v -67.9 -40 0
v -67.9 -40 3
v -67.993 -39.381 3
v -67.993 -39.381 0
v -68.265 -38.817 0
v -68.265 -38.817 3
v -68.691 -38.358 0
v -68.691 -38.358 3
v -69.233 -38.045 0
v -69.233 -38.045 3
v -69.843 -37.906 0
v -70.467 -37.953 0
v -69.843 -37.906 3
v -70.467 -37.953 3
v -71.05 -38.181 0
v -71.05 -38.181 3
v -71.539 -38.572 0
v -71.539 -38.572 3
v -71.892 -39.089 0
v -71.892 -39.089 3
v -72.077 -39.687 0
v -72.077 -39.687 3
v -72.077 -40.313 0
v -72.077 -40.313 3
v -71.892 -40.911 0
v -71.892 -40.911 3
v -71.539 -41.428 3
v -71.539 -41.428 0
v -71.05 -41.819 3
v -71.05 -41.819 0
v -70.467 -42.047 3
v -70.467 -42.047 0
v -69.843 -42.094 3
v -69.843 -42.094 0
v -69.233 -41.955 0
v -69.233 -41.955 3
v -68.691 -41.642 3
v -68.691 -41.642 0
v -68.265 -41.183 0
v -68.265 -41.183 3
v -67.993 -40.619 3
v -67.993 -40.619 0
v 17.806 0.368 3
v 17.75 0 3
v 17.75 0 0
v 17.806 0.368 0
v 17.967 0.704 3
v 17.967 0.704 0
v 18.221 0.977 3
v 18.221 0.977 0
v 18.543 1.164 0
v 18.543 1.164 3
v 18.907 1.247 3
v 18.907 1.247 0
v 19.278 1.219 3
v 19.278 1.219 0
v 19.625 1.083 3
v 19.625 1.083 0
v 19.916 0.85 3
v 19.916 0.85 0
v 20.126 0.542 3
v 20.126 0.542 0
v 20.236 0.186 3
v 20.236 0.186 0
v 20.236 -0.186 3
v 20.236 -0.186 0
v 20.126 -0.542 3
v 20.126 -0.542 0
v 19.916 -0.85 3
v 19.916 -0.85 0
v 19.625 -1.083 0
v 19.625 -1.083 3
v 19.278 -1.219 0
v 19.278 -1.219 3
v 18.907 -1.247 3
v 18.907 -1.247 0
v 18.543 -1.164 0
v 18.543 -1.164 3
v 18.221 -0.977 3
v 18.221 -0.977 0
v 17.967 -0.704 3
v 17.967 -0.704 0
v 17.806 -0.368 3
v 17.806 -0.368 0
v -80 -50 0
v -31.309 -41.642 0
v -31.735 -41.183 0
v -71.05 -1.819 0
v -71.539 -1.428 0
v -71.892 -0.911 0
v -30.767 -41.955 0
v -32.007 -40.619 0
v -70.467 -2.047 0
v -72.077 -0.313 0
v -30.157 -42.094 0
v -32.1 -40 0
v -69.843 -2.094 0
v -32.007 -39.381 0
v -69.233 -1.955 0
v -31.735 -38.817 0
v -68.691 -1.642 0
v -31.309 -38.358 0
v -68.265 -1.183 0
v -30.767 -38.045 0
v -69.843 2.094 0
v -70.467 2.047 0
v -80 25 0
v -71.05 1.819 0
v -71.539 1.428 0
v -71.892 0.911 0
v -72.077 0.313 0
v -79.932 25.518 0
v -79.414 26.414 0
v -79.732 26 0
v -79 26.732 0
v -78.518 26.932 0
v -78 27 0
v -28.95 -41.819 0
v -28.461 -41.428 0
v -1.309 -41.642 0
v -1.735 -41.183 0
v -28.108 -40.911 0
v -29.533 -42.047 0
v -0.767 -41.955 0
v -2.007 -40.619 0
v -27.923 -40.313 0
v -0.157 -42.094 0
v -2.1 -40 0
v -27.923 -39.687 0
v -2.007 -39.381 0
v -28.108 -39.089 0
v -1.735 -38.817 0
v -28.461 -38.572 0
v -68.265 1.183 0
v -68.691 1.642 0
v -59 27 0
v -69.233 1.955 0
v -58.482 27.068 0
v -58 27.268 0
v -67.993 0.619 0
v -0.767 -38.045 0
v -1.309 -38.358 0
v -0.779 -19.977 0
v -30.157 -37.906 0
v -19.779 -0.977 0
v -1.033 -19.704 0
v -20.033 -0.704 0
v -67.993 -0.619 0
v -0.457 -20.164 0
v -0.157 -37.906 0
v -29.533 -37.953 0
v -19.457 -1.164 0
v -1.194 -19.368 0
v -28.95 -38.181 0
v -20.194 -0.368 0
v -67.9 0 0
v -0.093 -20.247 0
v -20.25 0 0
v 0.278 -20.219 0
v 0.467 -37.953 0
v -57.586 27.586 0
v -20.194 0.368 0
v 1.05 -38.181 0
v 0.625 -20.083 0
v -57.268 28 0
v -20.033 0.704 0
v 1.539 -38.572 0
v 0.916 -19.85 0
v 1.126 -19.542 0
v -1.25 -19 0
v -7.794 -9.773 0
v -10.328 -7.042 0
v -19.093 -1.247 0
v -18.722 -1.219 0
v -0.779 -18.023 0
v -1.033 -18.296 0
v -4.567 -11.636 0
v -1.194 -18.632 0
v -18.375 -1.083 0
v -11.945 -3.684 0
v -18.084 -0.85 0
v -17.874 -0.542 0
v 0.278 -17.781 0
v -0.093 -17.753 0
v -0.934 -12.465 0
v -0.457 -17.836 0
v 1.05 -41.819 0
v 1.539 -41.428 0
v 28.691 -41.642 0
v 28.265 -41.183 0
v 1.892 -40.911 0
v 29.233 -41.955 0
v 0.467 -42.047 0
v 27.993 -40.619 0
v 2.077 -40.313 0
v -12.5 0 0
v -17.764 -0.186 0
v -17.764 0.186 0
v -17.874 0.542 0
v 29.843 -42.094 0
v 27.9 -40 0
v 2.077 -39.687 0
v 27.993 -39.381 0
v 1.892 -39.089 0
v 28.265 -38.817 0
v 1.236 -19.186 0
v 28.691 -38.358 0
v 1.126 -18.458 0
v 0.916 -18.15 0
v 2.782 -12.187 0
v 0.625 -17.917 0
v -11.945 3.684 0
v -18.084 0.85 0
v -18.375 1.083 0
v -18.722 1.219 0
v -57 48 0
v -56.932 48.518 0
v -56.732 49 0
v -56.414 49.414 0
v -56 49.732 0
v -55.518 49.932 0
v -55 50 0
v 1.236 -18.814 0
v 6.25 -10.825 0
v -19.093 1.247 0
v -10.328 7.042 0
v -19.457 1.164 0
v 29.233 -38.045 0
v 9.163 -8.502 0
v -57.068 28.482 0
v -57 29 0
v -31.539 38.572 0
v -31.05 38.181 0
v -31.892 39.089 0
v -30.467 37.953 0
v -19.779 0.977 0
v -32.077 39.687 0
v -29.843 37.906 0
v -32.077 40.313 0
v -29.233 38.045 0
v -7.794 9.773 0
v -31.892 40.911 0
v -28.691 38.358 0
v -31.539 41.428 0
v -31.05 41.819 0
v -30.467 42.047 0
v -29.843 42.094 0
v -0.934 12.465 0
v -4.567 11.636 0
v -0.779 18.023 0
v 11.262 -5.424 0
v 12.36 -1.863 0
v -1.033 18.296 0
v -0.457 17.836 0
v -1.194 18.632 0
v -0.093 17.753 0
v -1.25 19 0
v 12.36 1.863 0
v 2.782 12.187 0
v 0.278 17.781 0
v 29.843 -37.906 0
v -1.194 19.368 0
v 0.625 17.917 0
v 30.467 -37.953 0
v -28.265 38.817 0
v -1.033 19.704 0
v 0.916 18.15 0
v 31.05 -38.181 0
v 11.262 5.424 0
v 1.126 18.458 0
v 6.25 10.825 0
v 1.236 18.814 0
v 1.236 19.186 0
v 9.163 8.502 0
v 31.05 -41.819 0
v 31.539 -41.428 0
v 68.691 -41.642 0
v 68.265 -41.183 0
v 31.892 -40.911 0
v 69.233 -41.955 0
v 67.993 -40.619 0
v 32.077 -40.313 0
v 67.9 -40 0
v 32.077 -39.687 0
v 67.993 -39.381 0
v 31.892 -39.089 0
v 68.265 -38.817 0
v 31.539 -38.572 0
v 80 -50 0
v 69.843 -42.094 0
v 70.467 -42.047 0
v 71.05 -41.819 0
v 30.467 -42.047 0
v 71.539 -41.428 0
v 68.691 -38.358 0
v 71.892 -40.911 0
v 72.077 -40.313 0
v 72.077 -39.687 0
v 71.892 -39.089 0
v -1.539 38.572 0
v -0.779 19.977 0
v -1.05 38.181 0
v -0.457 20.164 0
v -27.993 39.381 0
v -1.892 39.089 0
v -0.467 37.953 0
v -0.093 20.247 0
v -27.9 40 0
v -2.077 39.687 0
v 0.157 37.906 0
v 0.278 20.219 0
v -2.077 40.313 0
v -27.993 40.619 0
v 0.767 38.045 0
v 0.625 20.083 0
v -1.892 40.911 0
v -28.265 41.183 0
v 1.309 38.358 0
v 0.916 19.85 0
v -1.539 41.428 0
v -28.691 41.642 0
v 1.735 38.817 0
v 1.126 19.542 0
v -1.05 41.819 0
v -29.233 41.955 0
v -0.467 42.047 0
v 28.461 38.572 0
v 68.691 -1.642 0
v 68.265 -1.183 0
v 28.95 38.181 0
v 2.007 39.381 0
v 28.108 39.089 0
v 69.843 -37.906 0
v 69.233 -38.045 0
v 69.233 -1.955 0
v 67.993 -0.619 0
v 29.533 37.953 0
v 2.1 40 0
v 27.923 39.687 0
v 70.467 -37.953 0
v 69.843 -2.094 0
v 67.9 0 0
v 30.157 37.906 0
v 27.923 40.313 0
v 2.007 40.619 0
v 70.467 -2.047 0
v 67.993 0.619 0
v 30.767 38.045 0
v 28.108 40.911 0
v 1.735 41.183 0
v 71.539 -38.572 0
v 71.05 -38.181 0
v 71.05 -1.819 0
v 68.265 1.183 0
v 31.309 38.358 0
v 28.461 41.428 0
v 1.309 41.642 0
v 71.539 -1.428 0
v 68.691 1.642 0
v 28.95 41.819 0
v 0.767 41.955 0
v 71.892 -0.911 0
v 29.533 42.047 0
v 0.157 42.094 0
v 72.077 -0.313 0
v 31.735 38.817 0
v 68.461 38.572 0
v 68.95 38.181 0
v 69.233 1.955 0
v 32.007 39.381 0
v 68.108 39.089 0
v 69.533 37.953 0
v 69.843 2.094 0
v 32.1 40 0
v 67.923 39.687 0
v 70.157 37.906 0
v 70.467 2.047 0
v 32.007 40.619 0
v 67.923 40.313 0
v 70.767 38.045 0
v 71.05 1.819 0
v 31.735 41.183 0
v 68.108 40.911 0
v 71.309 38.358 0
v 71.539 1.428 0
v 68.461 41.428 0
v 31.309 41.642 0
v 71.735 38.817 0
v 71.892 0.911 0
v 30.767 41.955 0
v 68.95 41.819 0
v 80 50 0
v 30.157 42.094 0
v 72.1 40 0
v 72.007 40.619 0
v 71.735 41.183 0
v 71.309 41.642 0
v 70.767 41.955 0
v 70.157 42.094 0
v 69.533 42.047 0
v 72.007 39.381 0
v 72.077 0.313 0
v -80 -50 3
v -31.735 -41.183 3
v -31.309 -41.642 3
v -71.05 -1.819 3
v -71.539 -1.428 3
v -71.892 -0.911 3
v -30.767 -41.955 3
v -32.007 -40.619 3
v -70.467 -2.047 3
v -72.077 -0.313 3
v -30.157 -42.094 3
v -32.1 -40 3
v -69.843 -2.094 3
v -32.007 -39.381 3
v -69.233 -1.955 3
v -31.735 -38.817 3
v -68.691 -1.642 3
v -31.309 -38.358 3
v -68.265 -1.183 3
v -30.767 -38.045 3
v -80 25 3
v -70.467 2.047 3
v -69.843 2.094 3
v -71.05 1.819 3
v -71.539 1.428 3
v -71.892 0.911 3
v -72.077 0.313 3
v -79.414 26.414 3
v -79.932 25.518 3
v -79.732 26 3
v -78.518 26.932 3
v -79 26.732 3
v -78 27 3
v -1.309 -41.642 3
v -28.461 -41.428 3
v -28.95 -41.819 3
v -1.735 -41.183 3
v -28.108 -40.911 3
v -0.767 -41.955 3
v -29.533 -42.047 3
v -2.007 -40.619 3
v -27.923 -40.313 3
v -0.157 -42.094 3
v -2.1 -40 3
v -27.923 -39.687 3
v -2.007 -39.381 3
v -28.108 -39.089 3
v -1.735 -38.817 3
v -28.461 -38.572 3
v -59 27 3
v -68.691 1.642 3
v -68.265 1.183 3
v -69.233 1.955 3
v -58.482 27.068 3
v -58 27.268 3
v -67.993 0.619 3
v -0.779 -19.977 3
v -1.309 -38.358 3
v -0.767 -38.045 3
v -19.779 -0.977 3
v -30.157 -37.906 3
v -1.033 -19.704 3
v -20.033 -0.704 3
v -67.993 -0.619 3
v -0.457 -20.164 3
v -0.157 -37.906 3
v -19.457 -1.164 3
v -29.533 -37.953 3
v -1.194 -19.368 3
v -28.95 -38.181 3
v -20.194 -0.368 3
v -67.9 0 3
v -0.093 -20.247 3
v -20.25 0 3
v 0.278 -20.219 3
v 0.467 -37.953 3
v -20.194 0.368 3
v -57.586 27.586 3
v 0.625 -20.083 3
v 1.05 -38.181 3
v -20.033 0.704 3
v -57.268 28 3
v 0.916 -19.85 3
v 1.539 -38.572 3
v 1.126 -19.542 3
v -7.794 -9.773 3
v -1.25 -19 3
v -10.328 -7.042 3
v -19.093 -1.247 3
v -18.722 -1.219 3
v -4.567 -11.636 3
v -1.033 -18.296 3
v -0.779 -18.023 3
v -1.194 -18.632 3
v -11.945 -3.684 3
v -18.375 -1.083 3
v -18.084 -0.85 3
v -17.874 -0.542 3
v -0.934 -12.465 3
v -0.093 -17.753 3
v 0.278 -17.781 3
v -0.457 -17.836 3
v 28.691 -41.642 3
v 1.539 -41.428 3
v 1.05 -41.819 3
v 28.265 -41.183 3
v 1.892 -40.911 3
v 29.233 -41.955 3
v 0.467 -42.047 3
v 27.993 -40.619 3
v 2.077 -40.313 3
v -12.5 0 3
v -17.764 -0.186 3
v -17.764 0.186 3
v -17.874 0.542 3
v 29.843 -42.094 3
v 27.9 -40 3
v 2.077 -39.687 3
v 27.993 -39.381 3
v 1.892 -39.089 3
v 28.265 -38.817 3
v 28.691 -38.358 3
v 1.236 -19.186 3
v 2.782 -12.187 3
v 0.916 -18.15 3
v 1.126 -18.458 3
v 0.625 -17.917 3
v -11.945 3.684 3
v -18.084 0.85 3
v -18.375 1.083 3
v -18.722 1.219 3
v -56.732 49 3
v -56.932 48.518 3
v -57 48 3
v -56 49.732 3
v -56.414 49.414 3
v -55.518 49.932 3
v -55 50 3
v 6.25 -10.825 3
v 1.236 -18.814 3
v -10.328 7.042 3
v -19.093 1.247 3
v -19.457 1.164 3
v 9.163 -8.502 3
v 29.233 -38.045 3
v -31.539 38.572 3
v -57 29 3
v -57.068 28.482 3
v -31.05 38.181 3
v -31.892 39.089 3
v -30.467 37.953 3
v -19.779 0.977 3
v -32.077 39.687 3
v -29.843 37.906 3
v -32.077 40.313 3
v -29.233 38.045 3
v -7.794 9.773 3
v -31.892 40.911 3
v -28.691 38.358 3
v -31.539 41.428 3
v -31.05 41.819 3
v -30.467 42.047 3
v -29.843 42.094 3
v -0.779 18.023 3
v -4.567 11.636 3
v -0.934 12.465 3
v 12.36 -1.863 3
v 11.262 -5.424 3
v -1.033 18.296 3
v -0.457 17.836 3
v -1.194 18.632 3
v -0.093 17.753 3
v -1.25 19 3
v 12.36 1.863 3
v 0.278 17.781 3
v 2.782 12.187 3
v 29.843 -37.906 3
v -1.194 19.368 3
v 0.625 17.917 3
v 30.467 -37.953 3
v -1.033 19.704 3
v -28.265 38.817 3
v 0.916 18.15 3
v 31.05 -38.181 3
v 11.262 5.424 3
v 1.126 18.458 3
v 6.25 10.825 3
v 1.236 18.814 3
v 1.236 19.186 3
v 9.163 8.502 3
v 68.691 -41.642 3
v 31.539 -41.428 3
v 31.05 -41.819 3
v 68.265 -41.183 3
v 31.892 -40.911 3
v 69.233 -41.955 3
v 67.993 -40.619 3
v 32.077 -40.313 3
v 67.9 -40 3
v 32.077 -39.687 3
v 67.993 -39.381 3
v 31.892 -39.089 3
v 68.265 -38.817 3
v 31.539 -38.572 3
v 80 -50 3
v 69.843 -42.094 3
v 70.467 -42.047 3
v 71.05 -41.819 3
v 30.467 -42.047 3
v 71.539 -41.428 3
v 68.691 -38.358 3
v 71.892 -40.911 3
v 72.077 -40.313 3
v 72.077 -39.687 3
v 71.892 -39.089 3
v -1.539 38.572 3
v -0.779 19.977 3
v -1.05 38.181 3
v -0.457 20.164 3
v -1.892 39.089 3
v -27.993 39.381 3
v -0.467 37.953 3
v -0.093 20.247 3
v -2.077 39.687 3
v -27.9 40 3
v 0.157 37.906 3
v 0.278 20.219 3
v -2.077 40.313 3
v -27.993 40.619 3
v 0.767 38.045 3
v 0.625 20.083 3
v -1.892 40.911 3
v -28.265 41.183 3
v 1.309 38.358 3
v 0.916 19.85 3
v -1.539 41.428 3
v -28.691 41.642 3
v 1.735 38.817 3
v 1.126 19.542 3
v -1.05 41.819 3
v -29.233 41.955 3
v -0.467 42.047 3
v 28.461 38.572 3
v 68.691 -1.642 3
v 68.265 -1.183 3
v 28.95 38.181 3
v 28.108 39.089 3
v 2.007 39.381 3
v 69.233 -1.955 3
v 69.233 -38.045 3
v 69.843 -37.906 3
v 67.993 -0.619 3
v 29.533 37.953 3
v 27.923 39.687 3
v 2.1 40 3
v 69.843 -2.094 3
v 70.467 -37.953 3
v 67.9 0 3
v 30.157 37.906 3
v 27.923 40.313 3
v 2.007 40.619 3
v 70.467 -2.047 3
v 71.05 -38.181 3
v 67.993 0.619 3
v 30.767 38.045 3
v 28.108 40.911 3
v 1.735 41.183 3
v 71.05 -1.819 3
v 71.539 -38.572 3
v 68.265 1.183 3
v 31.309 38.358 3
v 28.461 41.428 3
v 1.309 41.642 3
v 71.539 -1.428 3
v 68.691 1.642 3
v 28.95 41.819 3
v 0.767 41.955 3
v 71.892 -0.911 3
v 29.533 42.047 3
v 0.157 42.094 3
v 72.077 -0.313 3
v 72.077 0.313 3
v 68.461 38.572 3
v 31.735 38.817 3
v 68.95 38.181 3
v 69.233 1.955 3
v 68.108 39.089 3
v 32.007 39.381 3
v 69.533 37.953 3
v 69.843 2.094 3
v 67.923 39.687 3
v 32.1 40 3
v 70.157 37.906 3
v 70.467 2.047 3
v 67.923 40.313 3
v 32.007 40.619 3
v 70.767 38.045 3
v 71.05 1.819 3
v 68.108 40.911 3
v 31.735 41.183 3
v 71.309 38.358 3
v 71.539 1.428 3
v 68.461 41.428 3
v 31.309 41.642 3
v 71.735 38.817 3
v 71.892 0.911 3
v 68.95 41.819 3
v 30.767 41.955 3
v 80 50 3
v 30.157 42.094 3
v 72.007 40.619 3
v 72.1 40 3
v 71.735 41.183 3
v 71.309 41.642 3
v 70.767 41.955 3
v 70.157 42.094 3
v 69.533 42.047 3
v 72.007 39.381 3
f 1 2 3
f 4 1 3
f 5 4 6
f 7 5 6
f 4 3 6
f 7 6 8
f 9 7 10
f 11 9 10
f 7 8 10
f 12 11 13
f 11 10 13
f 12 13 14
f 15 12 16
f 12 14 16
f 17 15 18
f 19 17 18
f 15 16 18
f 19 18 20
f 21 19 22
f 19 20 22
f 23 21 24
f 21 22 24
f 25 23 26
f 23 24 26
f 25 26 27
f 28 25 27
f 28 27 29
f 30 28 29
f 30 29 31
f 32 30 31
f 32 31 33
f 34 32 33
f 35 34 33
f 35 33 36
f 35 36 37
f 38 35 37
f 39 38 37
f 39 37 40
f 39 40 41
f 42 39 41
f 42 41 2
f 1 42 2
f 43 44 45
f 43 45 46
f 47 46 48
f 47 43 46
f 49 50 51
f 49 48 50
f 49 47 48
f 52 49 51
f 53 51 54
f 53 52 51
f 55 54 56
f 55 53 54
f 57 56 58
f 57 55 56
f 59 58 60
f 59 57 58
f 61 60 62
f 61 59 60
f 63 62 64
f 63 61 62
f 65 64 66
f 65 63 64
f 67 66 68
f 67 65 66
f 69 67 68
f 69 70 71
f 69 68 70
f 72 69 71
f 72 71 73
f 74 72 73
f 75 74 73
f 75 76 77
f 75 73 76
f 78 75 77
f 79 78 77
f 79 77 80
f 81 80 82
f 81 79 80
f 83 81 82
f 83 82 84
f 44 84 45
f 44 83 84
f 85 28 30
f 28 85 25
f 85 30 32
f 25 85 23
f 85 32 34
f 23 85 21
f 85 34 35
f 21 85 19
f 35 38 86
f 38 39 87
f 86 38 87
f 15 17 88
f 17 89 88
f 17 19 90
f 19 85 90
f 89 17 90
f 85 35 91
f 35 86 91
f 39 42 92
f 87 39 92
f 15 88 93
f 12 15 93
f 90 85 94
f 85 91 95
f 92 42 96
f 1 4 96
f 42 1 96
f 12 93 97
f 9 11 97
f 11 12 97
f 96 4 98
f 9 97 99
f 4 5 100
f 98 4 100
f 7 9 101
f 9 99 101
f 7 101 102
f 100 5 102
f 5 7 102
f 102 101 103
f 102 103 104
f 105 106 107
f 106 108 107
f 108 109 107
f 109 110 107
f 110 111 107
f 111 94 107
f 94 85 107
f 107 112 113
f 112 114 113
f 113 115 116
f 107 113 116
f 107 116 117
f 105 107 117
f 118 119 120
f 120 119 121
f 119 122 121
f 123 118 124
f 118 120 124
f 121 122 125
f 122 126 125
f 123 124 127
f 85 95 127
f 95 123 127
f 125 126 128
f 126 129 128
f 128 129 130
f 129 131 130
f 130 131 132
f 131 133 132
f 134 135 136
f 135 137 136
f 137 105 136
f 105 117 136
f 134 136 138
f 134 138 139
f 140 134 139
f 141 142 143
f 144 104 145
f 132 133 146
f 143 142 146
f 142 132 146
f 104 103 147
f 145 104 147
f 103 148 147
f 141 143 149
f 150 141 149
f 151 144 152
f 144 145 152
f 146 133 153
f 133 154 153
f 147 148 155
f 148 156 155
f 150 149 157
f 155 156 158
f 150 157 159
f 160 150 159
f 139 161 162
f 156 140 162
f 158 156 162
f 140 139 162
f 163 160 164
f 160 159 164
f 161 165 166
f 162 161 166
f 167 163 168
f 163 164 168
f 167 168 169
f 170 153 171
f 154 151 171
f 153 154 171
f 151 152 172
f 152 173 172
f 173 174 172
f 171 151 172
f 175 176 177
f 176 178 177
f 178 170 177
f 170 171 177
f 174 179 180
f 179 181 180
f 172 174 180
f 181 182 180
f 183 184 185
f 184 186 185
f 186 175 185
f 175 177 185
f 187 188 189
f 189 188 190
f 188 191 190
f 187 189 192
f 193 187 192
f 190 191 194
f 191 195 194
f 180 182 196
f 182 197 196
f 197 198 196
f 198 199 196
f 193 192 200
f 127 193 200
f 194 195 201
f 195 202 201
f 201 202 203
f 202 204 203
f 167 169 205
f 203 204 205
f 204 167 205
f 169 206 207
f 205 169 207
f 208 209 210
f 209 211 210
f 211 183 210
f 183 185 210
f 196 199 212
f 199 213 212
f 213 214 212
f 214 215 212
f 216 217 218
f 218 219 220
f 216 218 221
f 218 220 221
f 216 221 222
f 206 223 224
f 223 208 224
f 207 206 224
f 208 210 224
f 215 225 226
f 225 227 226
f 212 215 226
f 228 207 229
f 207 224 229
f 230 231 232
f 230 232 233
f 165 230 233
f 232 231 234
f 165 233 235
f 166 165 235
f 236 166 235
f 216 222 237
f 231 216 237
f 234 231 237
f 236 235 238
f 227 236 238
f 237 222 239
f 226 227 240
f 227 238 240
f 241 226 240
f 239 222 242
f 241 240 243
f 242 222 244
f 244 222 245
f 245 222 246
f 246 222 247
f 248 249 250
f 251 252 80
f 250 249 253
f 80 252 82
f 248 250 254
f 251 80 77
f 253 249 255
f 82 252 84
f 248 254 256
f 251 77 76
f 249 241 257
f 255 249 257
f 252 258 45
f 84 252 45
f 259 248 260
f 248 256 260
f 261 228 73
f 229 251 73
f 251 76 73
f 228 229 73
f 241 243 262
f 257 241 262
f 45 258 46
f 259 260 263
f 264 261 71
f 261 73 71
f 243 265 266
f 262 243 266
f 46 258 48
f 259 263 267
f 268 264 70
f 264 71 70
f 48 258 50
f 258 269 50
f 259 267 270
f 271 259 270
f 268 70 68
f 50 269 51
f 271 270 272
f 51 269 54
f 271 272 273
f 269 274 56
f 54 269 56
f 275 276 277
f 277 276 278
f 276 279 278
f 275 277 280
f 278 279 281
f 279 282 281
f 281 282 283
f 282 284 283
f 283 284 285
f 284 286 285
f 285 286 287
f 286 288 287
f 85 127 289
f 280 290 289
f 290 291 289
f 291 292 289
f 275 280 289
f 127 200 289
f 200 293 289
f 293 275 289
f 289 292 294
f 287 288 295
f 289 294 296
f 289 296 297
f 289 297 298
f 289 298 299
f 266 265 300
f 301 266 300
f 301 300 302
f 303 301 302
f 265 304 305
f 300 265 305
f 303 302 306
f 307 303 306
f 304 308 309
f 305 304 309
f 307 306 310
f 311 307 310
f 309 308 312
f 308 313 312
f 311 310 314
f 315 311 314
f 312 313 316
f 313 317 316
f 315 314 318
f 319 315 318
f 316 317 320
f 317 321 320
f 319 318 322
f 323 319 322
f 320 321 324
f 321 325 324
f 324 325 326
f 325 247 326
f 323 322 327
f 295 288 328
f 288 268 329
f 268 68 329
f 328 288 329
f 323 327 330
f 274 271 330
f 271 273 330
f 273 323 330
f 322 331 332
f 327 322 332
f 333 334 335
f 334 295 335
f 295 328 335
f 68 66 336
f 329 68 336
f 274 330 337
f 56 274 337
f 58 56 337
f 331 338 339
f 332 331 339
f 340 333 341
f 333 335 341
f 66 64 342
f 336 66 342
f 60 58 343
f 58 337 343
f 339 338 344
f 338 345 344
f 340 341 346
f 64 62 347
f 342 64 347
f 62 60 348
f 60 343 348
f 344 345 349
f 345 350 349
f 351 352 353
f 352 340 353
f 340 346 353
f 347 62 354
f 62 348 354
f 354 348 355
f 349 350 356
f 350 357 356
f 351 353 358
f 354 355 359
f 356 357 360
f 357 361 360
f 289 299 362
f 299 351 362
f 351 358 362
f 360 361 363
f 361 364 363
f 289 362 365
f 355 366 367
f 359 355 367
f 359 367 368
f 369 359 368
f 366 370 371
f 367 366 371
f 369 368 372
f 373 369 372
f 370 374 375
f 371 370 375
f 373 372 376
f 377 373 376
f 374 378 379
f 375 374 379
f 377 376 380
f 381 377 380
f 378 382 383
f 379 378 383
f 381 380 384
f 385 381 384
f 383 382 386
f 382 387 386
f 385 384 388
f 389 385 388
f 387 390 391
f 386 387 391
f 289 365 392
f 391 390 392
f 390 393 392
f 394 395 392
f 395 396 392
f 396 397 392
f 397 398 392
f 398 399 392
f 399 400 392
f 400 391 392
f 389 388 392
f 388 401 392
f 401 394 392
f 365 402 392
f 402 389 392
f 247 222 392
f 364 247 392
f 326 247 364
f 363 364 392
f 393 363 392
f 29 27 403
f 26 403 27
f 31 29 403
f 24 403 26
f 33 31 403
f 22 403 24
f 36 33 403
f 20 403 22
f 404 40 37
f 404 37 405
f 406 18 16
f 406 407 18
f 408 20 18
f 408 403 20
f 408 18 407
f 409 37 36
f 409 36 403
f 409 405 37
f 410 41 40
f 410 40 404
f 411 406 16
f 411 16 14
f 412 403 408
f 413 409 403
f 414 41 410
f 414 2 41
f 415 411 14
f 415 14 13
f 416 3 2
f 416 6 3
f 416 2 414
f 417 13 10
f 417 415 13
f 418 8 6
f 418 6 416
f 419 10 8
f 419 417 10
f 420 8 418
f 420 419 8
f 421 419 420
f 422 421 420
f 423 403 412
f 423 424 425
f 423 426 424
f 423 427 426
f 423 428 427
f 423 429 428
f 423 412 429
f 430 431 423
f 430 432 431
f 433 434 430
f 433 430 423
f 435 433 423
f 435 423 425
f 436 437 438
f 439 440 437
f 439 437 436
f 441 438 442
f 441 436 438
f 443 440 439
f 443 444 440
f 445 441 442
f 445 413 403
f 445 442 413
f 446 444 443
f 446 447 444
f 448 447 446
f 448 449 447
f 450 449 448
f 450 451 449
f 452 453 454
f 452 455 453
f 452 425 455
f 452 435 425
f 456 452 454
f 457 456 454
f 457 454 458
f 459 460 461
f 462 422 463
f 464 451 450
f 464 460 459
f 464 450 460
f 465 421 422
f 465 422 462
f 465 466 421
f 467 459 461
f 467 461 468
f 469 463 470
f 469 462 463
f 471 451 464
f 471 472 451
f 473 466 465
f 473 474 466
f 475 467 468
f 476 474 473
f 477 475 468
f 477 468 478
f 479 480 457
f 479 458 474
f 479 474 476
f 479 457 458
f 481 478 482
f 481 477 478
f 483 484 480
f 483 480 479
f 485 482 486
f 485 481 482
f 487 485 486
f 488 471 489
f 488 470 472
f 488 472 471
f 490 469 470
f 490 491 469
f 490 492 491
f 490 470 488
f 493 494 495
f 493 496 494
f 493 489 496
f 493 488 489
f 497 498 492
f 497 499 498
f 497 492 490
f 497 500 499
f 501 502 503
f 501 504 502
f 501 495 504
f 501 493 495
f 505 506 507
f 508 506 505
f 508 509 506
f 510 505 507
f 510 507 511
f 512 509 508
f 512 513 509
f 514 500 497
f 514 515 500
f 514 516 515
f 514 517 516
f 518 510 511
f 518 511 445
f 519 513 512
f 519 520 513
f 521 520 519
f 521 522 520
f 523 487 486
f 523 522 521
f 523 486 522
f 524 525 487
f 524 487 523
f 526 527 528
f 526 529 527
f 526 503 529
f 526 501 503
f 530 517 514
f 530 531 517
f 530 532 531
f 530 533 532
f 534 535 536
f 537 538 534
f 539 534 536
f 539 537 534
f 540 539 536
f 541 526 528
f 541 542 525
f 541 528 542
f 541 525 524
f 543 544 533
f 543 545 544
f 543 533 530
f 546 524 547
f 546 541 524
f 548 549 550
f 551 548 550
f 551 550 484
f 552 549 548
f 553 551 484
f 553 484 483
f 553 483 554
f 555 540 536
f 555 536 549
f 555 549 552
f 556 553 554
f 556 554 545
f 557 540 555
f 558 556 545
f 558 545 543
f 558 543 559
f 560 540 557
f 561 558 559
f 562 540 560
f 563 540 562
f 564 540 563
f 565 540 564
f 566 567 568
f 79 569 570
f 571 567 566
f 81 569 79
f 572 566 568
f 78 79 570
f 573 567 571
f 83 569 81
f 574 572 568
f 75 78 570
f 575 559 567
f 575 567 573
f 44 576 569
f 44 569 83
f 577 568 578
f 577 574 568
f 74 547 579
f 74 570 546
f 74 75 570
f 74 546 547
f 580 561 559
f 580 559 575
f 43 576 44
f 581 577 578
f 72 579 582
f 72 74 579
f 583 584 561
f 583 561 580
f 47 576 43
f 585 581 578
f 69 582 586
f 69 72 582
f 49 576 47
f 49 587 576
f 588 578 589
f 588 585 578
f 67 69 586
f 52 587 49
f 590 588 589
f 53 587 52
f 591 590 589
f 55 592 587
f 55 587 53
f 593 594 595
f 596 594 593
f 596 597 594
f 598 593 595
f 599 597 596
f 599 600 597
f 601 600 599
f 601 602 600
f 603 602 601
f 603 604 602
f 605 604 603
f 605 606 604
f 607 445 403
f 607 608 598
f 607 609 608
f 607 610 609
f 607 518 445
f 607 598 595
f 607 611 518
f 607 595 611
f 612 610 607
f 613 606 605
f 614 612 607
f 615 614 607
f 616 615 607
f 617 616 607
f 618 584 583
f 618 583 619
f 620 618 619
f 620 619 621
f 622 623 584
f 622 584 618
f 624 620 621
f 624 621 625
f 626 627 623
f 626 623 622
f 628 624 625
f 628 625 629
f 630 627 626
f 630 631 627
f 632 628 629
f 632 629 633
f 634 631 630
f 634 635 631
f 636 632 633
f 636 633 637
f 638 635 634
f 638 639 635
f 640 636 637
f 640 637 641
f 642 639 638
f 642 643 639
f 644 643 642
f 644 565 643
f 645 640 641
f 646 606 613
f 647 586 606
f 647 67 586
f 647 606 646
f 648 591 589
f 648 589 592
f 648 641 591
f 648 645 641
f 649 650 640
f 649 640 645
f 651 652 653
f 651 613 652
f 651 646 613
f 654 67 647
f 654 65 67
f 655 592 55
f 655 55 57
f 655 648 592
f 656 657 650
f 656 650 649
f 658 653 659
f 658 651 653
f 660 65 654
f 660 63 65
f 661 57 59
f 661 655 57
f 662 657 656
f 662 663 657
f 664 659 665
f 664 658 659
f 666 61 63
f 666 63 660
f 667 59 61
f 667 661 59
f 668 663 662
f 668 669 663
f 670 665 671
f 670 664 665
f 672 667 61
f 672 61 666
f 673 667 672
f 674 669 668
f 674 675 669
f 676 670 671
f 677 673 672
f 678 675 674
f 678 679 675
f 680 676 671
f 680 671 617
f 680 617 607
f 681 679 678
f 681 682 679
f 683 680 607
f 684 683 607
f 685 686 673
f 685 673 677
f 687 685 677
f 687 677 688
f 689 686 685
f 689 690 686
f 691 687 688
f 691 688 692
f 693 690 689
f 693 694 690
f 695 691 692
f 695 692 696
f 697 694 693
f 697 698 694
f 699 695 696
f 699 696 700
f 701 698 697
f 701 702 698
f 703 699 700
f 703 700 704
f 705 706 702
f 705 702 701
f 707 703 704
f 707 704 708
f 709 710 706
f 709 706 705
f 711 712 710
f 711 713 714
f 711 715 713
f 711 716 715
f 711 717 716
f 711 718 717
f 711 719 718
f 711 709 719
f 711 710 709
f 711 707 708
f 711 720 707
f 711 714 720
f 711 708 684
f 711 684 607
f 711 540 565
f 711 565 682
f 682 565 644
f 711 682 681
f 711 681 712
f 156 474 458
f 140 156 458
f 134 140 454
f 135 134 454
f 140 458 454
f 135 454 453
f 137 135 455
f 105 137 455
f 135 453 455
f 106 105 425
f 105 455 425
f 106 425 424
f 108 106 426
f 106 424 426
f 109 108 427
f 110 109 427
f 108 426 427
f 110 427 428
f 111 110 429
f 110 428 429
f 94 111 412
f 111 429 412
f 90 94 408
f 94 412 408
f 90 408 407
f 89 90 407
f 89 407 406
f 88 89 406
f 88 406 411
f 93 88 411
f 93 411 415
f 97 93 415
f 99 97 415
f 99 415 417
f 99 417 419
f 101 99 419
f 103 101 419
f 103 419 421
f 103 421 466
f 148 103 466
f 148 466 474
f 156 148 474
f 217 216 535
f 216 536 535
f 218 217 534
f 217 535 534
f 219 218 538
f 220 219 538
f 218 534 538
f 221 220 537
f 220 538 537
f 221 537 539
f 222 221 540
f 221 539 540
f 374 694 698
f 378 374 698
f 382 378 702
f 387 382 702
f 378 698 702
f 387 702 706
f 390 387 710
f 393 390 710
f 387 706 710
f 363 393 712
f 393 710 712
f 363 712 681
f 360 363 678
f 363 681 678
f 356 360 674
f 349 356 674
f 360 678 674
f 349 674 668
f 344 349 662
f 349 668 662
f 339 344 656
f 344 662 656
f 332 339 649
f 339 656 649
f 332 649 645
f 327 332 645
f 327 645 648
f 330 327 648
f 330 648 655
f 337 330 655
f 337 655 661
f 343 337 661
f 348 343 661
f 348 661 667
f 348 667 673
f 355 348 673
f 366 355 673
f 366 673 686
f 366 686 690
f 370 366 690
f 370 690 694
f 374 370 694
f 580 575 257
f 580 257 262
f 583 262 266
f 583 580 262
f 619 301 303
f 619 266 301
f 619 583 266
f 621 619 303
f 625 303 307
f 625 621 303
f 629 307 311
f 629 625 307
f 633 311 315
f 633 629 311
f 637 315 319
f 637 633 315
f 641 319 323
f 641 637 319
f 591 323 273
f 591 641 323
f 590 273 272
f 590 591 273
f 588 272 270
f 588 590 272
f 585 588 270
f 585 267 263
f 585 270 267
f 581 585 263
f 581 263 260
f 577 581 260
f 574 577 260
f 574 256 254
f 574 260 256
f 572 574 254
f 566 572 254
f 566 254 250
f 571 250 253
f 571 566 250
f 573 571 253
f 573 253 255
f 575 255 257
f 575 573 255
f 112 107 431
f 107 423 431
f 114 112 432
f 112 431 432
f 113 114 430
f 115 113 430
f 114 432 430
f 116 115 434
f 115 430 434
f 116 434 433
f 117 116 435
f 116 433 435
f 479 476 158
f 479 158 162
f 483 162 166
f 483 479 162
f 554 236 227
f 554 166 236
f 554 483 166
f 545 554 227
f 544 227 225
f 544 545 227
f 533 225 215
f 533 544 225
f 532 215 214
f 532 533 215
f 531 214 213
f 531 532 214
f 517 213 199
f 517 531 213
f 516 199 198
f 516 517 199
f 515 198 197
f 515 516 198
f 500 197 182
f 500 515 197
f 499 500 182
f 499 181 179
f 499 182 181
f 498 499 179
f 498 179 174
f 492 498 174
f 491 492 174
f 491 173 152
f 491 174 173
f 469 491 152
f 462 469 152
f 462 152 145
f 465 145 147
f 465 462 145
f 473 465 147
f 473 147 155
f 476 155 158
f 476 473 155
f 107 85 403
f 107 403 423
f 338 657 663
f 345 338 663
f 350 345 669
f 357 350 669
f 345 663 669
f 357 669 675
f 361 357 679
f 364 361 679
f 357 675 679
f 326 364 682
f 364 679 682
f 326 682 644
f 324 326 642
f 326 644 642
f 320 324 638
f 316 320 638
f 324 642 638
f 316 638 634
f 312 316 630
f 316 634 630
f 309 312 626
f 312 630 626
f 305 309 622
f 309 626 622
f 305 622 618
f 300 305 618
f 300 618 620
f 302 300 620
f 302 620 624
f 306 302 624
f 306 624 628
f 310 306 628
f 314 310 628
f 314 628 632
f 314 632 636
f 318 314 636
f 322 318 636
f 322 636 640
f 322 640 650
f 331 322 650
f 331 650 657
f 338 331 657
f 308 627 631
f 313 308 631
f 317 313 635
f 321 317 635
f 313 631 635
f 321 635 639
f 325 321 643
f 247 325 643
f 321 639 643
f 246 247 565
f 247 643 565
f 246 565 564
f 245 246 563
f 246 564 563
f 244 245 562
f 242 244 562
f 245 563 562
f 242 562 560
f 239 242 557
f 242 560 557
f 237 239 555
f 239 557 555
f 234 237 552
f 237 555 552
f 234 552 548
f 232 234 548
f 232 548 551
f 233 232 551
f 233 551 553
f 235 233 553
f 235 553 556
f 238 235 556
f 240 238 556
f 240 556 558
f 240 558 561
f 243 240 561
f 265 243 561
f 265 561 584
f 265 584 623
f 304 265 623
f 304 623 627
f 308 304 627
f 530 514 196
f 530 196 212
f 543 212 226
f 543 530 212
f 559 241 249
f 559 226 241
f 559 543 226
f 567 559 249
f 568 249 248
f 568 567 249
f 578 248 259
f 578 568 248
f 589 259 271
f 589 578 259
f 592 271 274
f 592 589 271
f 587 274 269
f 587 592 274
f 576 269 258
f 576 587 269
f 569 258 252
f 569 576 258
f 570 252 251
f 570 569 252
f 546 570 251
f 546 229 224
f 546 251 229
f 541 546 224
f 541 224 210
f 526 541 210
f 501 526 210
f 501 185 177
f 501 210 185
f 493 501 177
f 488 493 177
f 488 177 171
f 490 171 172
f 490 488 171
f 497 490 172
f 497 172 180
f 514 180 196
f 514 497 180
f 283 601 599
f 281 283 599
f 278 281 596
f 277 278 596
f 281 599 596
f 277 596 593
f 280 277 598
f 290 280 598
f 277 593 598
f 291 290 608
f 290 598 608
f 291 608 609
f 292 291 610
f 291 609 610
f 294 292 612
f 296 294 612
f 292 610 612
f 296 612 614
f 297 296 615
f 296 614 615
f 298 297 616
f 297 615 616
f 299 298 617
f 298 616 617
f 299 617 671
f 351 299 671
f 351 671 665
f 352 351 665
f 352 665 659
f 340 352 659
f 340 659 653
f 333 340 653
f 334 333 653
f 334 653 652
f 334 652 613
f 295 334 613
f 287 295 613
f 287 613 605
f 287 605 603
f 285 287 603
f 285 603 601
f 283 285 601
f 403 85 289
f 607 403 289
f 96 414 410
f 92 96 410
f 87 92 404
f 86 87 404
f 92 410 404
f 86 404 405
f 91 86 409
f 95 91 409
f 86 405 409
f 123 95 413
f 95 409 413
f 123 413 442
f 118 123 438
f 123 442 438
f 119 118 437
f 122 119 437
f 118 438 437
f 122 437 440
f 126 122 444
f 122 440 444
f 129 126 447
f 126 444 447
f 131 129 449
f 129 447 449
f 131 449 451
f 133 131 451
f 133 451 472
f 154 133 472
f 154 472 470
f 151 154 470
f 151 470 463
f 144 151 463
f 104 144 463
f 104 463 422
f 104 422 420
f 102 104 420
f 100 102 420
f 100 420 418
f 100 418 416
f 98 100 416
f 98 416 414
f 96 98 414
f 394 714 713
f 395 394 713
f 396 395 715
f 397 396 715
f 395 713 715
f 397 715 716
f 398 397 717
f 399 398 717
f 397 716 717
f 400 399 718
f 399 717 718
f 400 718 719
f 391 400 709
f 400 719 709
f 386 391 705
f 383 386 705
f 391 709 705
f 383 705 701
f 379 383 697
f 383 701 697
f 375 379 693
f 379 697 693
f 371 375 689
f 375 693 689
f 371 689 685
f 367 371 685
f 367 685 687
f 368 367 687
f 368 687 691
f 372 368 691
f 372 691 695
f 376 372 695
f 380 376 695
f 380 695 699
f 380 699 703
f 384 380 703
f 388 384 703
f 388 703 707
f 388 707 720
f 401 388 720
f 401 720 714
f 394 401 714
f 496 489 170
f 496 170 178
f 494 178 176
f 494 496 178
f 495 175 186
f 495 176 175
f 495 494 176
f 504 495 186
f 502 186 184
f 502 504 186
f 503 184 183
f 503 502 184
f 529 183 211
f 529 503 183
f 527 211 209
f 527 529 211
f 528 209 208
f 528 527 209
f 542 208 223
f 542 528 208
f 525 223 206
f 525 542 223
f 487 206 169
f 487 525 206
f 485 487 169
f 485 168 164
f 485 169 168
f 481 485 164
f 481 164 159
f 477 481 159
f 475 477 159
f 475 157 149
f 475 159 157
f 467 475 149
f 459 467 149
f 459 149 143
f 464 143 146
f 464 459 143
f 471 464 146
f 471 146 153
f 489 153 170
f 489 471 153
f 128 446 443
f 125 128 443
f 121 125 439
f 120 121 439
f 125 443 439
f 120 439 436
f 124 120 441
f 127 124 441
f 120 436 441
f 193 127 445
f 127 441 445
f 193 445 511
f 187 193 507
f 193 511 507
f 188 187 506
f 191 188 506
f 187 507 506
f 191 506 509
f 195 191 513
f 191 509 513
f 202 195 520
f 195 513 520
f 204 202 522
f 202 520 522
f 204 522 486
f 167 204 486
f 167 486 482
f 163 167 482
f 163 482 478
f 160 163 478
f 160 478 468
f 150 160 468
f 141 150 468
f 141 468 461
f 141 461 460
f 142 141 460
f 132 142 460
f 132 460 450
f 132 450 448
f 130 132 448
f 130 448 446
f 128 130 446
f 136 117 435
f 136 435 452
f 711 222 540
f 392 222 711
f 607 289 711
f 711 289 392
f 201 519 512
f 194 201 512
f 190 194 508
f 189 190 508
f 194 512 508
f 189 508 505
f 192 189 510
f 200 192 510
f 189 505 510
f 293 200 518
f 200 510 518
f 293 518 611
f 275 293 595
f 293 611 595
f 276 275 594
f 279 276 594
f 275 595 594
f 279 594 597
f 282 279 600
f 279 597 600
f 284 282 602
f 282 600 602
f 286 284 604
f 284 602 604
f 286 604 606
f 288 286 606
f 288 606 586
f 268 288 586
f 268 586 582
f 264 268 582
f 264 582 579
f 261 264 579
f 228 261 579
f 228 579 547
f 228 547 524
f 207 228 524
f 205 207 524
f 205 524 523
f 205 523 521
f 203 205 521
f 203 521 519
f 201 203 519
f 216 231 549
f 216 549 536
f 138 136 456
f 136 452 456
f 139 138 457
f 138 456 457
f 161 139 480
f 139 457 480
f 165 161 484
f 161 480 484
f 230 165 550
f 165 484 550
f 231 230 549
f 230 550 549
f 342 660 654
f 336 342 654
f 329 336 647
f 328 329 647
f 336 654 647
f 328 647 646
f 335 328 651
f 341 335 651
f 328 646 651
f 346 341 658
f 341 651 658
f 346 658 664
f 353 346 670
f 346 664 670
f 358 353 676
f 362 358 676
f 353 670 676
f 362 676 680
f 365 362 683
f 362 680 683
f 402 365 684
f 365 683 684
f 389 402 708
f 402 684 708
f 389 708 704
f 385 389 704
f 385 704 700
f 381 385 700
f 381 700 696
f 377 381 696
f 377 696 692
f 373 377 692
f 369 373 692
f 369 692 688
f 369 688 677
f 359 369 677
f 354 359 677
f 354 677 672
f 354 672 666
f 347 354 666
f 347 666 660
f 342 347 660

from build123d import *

# Parameters (mm, degrees)
SKETCH_1_W               = 160
SKETCH_1_H               = 100
EXTRUDE_1_DEPTH          = 3
SKETCH_2_R               = 2.1
CUT_EXTRUDE_1_DEPTH      = 95.387499172
CUT_EXTRUDE_2_DEPTH      = 95.387499172
CUT_EXTRUDE_2_DEPTH_BACK = 95.387499172
SKETCH_3_R               = 1.25
CUT_EXTRUDE_3_DEPTH      = 95.387499172
CUT_EXTRUDE_3_DEPTH_BACK = 95.387499172
SKETCH_4_R               = 12.5
CUT_EXTRUDE_4_DEPTH      = 95.387499172
CUT_EXTRUDE_4_DEPTH_BACK = 95.387499172
SKETCH_5_W               = 23
SKETCH_5_H               = 23
FILLET_1_R               = 2


with BuildPart() as part:
    # 草图1 → 凸台-拉伸1 (new body)
    with BuildSketch(Plane.XY):
        Rectangle(SKETCH_1_W, SKETCH_1_H)
    extrude(amount=EXTRUDE_1_DEPTH)

    # 草图2 → 切除-拉伸1 (cut, through all)
    with BuildSketch(Plane.XY.offset(3)):
        with Locations((-70, 40)):
            Circle(SKETCH_2_R)
        with Locations((-30, 40)):
            Circle(SKETCH_2_R)
        with Locations((0, 40)):
            Circle(SKETCH_2_R)
        with Locations((30, 40)):
            Circle(SKETCH_2_R)
        with Locations((70, 40)):
            Circle(SKETCH_2_R)
        with Locations((-70, 0)):
            Circle(SKETCH_2_R)
        with Locations((-70, -40)):
            Circle(SKETCH_2_R)
        with Locations((-70, -80)):
            Circle(SKETCH_2_R)
        with Locations((-70, -120)):
            Circle(SKETCH_2_R)
        with Locations((-70, -160)):
            Circle(SKETCH_2_R)
        with Locations((-70, -200)):
            Circle(SKETCH_2_R)
        with Locations((-70, -240)):
            Circle(SKETCH_2_R)
        with Locations((-70, -280)):
            Circle(SKETCH_2_R)
        with Locations((70, -280)):
            Circle(SKETCH_2_R)
        with Locations((70, -240)):
            Circle(SKETCH_2_R)
        with Locations((70, -200)):
            Circle(SKETCH_2_R)
        with Locations((70, -160)):
            Circle(SKETCH_2_R)
        with Locations((70, -120)):
            Circle(SKETCH_2_R)
        with Locations((70, -80)):
            Circle(SKETCH_2_R)
        with Locations(Location((70, -40, 0), (0, 0, 180))):
            Circle(SKETCH_2_R)
        with Locations(Location((70, 0, 0), (0, 0, 180))):
            Circle(SKETCH_2_R)
        with Locations(Location((30, -40, 0), (0, 0, 180))):
            Circle(SKETCH_2_R)
        with Locations(Location((0, -40, 0), (0, 0, 180))):
            Circle(SKETCH_2_R)
        with Locations(Location((-30, -40, 0), (0, 0, 180))):
            Circle(SKETCH_2_R)
    extrude(amount=-CUT_EXTRUDE_1_DEPTH, mode=Mode.SUBTRACT)

    # 草图3 → 切除-拉伸2 (cut, two sides: drawn at the far end of the back side and taken through both)
    with BuildSketch(Plane(origin=(0, 0, 0), x_dir=(-1, 0, 0), z_dir=(0, 0, -1)).offset(-CUT_EXTRUDE_2_DEPTH_BACK)):
        with Locations((19, 0)):
            Circle(SKETCH_3_R)
        with Locations((0, -19)):
            Circle(SKETCH_3_R)
        with Locations((-19, 0)):
            Circle(SKETCH_3_R)
        with Locations((0, 19)):
            Circle(SKETCH_3_R)
    extrude(amount=CUT_EXTRUDE_2_DEPTH + CUT_EXTRUDE_2_DEPTH_BACK, mode=Mode.SUBTRACT)

    # 草图4 → 切除-拉伸3 (cut, two sides: drawn at the far end of the back side and taken through both)
    with BuildSketch(Plane(origin=(0, 0, 0), x_dir=(-1, 0, 0), z_dir=(0, 0, -1)).offset(-CUT_EXTRUDE_3_DEPTH_BACK)):
        Circle(SKETCH_4_R)
    extrude(amount=CUT_EXTRUDE_3_DEPTH + CUT_EXTRUDE_3_DEPTH_BACK, mode=Mode.SUBTRACT)

    # 草图5 → 切除-拉伸4 (cut, two sides: drawn at the far end of the back side and taken through both)
    with BuildSketch(Plane.XY.offset(3).offset(-CUT_EXTRUDE_4_DEPTH_BACK)):
        with Locations((-68.5, 38.5)):
            Rectangle(SKETCH_5_W, SKETCH_5_H)
    extrude(amount=CUT_EXTRUDE_4_DEPTH + CUT_EXTRUDE_4_DEPTH_BACK, mode=Mode.SUBTRACT)

    # 圆角1
    fillet_1_edges = [part.edges().sort_by_distance(p)[0] for p in [
        (-80, 27, 1.5),
        (-57, 50, 1.5),
        (-57, 27, 1.5),
    ]]
    fillet(fillet_1_edges, radius=FILLET_1_R)


solid = part.part
